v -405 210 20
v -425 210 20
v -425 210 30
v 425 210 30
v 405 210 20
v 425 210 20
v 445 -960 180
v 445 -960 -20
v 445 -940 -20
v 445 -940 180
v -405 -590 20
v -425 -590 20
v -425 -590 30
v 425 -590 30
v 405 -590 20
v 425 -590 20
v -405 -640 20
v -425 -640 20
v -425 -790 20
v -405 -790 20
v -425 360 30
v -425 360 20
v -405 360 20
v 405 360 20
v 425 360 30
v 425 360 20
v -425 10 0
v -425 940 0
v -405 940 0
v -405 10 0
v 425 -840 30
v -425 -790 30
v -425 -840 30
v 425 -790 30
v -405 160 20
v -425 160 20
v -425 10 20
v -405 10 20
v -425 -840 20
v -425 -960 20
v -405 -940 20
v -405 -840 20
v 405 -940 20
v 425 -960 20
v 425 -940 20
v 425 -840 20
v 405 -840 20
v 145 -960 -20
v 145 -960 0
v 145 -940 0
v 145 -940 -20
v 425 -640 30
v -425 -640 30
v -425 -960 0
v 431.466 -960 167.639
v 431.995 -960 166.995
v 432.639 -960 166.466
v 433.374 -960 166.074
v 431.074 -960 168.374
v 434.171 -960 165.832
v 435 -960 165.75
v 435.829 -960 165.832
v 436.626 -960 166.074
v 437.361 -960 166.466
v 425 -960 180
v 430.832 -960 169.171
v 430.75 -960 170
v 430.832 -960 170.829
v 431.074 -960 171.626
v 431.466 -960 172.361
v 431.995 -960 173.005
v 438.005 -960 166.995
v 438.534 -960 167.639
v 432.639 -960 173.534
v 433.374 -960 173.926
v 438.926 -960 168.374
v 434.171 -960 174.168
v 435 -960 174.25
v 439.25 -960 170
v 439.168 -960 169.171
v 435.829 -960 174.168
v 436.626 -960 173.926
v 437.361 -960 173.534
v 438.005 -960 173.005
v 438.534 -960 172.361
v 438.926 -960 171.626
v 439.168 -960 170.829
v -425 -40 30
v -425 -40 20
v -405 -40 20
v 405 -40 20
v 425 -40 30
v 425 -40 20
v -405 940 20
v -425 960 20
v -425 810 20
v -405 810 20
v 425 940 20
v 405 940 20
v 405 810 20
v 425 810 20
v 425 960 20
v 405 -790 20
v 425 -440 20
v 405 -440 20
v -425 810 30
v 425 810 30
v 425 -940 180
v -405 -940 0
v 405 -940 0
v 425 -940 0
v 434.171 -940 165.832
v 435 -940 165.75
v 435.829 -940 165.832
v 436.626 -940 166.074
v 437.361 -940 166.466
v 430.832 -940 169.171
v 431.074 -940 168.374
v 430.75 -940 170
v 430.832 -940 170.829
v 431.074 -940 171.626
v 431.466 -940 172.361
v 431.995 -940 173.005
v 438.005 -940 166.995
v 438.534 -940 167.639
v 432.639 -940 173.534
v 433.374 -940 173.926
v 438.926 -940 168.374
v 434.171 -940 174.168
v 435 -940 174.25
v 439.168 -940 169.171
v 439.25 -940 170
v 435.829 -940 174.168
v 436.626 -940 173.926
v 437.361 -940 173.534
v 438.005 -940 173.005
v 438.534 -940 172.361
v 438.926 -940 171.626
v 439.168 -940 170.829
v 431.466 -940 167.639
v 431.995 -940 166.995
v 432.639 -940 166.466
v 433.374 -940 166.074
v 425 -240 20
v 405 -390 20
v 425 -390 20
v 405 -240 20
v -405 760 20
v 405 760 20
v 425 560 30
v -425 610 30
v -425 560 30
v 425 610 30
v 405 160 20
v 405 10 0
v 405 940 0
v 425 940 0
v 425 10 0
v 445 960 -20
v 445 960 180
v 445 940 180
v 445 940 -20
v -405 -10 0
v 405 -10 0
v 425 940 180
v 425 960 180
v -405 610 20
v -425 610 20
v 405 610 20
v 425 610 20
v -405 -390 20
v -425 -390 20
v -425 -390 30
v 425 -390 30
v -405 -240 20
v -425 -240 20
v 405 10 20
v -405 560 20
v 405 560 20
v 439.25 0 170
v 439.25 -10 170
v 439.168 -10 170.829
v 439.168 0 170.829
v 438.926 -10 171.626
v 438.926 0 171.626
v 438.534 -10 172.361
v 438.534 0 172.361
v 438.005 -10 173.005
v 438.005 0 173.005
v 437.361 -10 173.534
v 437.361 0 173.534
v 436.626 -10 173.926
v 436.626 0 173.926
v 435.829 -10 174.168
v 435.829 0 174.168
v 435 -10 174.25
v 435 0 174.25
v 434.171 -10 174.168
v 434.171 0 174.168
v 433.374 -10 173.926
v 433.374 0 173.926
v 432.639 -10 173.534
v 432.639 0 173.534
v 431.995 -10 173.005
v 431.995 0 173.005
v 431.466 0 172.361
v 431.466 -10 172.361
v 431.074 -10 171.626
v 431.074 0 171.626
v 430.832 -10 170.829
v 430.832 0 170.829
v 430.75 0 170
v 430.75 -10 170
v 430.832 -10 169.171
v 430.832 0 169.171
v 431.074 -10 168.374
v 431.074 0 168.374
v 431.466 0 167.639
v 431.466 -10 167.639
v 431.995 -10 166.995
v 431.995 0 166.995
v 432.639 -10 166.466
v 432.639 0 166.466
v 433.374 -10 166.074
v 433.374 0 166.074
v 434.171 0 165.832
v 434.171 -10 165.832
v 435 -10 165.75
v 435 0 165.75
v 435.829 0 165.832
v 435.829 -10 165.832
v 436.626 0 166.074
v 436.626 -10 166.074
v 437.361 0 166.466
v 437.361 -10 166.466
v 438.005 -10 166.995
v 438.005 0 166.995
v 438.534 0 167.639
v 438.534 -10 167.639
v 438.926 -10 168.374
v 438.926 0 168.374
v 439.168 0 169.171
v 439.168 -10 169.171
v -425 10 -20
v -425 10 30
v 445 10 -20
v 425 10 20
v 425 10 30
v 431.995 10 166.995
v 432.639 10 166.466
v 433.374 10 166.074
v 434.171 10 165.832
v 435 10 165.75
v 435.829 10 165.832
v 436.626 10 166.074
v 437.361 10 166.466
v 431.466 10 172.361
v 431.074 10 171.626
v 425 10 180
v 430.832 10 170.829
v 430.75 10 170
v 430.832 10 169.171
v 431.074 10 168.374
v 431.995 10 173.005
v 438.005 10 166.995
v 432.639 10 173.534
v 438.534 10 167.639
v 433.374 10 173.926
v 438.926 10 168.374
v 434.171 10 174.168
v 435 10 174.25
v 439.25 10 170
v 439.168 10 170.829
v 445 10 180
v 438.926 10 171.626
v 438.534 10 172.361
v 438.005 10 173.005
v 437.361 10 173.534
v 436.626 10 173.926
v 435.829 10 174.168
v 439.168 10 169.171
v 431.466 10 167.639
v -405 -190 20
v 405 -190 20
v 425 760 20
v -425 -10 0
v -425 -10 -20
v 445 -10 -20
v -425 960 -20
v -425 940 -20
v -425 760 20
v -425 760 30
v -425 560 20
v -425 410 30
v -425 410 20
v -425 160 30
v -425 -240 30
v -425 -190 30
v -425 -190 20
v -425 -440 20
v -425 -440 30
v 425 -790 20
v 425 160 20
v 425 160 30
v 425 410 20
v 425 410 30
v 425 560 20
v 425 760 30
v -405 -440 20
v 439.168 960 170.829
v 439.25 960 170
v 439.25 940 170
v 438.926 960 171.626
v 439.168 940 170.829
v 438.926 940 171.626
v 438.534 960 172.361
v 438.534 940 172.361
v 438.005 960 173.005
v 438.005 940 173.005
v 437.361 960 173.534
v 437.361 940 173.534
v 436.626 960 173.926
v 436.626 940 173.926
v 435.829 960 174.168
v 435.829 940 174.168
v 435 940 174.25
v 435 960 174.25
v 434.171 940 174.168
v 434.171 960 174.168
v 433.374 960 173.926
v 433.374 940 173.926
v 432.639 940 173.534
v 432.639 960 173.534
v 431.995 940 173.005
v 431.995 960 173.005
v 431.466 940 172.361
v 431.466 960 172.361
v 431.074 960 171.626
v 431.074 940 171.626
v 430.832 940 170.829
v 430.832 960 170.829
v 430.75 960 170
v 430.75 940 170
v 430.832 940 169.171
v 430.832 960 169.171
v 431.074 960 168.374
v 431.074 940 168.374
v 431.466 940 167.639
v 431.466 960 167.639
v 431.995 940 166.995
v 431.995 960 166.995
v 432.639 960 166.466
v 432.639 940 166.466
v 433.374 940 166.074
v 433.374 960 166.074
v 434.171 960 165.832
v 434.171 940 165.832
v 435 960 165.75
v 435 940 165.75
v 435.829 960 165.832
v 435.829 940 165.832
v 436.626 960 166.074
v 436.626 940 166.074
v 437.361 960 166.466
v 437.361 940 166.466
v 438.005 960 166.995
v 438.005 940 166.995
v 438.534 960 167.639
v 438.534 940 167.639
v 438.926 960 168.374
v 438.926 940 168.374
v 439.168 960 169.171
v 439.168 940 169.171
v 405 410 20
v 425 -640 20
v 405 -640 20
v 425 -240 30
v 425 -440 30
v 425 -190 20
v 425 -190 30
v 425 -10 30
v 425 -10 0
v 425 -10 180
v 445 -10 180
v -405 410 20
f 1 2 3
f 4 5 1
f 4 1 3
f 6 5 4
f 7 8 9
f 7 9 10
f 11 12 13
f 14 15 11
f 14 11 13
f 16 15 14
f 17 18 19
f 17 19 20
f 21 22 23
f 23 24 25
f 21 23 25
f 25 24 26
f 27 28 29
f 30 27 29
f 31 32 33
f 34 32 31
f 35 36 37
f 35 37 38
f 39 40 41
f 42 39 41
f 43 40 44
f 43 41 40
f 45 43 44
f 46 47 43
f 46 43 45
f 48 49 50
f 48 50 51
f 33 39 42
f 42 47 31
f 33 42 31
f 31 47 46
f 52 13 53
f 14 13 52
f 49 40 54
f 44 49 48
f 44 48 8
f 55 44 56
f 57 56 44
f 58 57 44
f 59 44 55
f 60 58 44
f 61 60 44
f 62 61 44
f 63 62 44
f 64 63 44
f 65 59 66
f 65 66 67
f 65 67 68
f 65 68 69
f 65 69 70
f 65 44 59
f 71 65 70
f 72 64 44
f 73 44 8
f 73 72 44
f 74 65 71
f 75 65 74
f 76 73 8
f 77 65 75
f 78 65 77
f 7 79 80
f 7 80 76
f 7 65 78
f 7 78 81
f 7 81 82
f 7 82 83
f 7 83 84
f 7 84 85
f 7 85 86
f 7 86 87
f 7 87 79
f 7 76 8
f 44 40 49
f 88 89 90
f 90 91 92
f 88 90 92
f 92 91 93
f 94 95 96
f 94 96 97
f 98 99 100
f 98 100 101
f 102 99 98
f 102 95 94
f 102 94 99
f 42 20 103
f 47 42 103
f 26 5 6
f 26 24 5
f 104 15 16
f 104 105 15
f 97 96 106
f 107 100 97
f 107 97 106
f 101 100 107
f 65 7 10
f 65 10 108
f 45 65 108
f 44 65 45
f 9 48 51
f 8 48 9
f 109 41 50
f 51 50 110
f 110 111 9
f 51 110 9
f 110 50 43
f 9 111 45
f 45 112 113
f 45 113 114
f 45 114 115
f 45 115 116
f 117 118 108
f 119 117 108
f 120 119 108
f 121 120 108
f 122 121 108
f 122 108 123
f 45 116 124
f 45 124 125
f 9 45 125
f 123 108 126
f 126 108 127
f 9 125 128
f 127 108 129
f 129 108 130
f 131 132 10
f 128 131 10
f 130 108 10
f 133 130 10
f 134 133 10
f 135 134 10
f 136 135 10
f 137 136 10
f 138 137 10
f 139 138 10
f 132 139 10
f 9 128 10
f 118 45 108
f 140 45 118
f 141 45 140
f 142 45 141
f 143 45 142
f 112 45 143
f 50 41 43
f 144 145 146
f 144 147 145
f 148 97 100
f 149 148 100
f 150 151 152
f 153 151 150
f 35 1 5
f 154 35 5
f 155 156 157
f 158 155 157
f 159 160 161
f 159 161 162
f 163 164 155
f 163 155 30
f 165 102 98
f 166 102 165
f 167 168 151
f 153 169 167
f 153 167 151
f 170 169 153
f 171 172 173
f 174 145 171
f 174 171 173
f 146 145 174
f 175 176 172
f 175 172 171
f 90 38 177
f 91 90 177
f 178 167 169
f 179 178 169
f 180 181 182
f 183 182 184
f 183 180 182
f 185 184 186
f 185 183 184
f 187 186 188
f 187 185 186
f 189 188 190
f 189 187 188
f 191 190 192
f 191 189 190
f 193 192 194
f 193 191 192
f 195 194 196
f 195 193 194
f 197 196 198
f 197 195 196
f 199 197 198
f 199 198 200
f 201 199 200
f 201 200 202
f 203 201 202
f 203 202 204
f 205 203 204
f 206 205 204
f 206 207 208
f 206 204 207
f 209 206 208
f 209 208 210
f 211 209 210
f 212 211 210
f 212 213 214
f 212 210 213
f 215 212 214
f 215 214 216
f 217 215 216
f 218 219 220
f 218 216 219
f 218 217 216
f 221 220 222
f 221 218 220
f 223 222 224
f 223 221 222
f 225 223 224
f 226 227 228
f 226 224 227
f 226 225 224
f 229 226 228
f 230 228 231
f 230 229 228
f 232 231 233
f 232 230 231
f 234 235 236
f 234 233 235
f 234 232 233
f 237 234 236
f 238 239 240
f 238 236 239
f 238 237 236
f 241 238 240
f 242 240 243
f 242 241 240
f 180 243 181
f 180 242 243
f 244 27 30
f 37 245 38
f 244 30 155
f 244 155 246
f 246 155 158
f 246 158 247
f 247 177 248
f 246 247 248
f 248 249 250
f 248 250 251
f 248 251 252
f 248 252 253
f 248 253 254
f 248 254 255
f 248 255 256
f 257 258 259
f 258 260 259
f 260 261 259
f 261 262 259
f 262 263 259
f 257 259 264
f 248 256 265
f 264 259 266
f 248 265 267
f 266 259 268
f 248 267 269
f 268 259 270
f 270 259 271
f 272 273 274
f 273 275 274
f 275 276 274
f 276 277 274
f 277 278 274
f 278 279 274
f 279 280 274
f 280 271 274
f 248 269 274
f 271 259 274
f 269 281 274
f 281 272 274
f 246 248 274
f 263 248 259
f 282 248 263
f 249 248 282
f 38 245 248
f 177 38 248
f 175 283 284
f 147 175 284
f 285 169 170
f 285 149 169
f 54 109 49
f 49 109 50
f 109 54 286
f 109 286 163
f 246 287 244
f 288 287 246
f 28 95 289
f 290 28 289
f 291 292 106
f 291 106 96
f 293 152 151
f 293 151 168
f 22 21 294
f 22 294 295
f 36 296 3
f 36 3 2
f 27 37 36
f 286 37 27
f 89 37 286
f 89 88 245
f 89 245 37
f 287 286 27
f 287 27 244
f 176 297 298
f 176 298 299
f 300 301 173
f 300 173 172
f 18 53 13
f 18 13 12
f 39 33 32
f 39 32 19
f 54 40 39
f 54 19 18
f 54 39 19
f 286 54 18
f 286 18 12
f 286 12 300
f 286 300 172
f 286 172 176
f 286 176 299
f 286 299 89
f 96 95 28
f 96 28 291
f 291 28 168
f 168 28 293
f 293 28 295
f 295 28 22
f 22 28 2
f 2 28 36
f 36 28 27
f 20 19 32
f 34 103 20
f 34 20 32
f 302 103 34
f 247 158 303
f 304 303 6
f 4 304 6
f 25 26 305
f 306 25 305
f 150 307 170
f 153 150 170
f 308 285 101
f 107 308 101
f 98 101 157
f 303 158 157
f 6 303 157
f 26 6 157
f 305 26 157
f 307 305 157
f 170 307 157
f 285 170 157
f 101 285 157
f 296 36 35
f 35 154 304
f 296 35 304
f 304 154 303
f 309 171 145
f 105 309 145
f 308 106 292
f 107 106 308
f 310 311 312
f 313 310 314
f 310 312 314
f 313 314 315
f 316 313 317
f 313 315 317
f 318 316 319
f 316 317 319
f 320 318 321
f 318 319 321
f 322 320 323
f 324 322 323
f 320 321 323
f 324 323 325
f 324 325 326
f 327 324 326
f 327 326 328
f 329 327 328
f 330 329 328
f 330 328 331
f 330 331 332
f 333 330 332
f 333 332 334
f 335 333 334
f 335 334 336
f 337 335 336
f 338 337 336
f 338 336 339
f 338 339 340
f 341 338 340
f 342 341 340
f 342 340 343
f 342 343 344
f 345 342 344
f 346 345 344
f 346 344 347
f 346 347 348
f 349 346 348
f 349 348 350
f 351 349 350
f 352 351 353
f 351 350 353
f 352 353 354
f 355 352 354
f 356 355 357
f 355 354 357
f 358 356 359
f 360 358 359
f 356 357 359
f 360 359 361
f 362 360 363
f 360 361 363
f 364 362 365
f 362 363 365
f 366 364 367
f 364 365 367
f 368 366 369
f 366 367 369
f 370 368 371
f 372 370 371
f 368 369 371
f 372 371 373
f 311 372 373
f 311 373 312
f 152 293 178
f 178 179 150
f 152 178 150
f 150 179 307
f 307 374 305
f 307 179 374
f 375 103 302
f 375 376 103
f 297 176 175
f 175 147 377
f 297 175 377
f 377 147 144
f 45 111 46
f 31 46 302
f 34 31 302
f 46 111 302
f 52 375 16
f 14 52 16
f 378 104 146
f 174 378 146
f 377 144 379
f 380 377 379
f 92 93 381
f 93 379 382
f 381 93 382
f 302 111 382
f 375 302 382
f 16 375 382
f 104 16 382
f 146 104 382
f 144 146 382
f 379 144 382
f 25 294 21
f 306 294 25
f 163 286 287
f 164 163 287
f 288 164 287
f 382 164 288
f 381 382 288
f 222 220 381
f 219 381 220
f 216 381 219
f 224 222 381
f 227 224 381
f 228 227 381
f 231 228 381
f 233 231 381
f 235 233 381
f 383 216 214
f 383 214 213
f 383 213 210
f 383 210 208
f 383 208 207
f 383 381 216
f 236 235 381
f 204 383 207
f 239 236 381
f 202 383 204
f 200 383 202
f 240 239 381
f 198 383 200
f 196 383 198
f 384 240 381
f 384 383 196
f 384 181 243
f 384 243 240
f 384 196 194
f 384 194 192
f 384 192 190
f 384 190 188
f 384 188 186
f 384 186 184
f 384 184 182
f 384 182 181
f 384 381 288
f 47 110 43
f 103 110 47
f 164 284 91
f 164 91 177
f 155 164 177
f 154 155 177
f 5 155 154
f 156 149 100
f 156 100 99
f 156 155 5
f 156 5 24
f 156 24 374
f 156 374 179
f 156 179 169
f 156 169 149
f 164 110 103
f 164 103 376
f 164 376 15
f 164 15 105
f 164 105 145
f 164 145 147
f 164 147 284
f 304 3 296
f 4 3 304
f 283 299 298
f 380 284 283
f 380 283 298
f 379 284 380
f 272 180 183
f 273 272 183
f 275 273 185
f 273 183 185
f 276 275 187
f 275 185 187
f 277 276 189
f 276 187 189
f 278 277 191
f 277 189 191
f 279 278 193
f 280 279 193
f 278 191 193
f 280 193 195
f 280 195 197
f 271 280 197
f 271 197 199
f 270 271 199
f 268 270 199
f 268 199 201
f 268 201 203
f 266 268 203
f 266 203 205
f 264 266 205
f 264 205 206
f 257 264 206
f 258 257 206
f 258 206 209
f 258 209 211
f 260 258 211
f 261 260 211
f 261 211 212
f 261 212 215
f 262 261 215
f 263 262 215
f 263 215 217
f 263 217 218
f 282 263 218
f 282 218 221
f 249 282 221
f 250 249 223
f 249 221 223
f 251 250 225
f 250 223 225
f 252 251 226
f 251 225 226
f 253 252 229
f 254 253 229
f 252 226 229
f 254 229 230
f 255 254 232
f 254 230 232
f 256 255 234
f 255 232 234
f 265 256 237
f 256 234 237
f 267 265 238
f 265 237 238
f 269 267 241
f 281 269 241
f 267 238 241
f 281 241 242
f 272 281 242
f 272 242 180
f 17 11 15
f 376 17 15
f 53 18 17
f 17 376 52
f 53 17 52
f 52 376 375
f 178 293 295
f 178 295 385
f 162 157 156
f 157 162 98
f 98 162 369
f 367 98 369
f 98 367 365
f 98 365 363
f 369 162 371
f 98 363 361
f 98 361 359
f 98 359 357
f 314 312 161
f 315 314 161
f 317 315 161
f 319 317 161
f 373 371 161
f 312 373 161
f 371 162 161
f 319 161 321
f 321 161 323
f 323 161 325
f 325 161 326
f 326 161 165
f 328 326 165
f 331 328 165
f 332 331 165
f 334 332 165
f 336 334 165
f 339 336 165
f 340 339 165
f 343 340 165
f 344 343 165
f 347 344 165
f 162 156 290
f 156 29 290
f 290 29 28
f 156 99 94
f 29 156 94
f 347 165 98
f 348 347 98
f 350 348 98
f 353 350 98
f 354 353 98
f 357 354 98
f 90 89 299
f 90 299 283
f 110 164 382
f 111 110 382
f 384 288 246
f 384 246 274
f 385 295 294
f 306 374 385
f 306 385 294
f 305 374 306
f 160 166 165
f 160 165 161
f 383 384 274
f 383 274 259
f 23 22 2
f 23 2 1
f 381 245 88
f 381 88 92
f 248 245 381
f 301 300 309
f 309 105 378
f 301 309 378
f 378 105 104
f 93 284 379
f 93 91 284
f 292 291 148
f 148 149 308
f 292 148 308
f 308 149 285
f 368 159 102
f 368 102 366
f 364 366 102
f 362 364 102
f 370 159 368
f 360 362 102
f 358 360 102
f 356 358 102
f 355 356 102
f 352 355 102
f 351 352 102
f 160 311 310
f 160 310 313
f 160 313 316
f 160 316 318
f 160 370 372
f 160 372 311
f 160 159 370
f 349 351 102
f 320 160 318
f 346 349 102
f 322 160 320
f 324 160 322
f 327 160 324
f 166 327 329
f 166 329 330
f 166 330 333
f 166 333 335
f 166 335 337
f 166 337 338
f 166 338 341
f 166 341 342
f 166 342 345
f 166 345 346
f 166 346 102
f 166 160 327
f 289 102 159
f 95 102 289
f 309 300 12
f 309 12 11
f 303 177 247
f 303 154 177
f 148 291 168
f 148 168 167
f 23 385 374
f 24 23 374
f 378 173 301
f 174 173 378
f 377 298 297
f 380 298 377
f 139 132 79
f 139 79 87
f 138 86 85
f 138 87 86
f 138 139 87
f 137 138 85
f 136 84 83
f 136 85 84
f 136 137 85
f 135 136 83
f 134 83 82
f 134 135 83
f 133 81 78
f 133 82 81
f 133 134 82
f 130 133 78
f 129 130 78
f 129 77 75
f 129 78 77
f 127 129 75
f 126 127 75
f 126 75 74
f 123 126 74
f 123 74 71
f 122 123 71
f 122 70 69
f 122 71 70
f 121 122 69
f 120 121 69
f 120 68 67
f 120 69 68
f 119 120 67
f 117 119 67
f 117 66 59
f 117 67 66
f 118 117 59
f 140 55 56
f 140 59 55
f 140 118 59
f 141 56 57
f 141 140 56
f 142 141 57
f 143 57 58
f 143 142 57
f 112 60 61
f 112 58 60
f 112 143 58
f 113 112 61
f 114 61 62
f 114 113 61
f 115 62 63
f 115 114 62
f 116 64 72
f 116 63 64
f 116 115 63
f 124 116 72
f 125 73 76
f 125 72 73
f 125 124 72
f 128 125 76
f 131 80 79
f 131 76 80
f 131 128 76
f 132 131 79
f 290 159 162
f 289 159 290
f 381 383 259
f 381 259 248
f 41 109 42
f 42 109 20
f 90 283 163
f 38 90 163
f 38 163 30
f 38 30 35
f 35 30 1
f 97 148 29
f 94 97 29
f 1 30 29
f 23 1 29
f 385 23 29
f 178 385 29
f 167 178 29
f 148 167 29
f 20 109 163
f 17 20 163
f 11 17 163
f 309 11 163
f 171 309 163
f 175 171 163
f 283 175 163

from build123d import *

# Parameters (mm, degrees)
F0_W           = 850
F0_H           = 1920
F0_W_2         = 810
F0_H_2         = 1880
F1_DEPTH       = 20
F2_W           = 850
F2_H           = 50
F3_DEPTH       = 10
F6_DEPTH       = 20
F8_DEPTH       = 10
F8_DEPTH_BACK  = 10
F10_DEPTH      = 20
F11_R          = 4.25
F12_DEPTH      = 960.001
F12_DEPTH_BACK = 960.001


with BuildPart() as f1:
    # F0 (on Top) → F1 (new body)
    with BuildSketch(Plane.XY):
        Rectangle(F0_W, F0_H)
        Rectangle(F0_W_2, F0_H_2, mode=Mode.SUBTRACT)
    extrude(amount=F1_DEPTH)

    # F2 (on face) → F3 (join)
    with BuildSketch(Plane.XY.offset(20)):
        with Locations((0, 785)):
            Rectangle(F2_W, F2_H)
        with Locations((0, 585)):
            Rectangle(F2_W, F2_H)
        with Locations((0, 385)):
            Rectangle(F2_W, F2_H)
        with Locations((0, 185)):
            Rectangle(F2_W, F2_H)
        with Locations((0, -15)):
            Rectangle(F2_W, F2_H)
        with Locations((0, -215)):
            Rectangle(F2_W, F2_H)
        with Locations((0, -415)):
            Rectangle(F2_W, F2_H)
        with Locations((0, -615)):
            Rectangle(F2_W, F2_H)
        with Locations((0, -815)):
            Rectangle(F2_W, F2_H)
    extrude(amount=F3_DEPTH)

    # F5 (on face) → F6 (join)
    with BuildSketch(Plane.XZ.offset(960)):
        Polygon((445, 180), (425, 180), (425, 0), (145, 0), (145, -20), (445, -20), align=None)
    extrude(amount=-F6_DEPTH)

    # F7 (on Front) → F8 (join, two sides)
    with BuildSketch(Plane.XZ) as f8_sk:
        Polygon((425, 0), (-425, 0), (-425, -20), (445, -20), (445, 180), (425, 180), align=None)
    extrude(amount=F8_DEPTH)
    extrude(f8_sk.sketch, amount=-F8_DEPTH_BACK)

    # F9 (on face) → F10 (join)
    with BuildSketch(Plane(origin=(0, 960, 0), x_dir=(-1, 0, 0), z_dir=(0, 1, 0))):
        Polygon((425, 0), (-425, 0), (-425, 180), (-445, 180), (-445, -20), (425, -20), align=None)
    extrude(amount=-F10_DEPTH)

    # F11 (on Front) → F12 (cut, two sides)
    with BuildSketch(Plane.XZ) as f12_sk:
        with Locations((435, 170)):
            Circle(F11_R)
    extrude(amount=-F12_DEPTH, mode=Mode.SUBTRACT)
    extrude(f12_sk.sketch, amount=F12_DEPTH_BACK, mode=Mode.SUBTRACT)


solid = f1.part
